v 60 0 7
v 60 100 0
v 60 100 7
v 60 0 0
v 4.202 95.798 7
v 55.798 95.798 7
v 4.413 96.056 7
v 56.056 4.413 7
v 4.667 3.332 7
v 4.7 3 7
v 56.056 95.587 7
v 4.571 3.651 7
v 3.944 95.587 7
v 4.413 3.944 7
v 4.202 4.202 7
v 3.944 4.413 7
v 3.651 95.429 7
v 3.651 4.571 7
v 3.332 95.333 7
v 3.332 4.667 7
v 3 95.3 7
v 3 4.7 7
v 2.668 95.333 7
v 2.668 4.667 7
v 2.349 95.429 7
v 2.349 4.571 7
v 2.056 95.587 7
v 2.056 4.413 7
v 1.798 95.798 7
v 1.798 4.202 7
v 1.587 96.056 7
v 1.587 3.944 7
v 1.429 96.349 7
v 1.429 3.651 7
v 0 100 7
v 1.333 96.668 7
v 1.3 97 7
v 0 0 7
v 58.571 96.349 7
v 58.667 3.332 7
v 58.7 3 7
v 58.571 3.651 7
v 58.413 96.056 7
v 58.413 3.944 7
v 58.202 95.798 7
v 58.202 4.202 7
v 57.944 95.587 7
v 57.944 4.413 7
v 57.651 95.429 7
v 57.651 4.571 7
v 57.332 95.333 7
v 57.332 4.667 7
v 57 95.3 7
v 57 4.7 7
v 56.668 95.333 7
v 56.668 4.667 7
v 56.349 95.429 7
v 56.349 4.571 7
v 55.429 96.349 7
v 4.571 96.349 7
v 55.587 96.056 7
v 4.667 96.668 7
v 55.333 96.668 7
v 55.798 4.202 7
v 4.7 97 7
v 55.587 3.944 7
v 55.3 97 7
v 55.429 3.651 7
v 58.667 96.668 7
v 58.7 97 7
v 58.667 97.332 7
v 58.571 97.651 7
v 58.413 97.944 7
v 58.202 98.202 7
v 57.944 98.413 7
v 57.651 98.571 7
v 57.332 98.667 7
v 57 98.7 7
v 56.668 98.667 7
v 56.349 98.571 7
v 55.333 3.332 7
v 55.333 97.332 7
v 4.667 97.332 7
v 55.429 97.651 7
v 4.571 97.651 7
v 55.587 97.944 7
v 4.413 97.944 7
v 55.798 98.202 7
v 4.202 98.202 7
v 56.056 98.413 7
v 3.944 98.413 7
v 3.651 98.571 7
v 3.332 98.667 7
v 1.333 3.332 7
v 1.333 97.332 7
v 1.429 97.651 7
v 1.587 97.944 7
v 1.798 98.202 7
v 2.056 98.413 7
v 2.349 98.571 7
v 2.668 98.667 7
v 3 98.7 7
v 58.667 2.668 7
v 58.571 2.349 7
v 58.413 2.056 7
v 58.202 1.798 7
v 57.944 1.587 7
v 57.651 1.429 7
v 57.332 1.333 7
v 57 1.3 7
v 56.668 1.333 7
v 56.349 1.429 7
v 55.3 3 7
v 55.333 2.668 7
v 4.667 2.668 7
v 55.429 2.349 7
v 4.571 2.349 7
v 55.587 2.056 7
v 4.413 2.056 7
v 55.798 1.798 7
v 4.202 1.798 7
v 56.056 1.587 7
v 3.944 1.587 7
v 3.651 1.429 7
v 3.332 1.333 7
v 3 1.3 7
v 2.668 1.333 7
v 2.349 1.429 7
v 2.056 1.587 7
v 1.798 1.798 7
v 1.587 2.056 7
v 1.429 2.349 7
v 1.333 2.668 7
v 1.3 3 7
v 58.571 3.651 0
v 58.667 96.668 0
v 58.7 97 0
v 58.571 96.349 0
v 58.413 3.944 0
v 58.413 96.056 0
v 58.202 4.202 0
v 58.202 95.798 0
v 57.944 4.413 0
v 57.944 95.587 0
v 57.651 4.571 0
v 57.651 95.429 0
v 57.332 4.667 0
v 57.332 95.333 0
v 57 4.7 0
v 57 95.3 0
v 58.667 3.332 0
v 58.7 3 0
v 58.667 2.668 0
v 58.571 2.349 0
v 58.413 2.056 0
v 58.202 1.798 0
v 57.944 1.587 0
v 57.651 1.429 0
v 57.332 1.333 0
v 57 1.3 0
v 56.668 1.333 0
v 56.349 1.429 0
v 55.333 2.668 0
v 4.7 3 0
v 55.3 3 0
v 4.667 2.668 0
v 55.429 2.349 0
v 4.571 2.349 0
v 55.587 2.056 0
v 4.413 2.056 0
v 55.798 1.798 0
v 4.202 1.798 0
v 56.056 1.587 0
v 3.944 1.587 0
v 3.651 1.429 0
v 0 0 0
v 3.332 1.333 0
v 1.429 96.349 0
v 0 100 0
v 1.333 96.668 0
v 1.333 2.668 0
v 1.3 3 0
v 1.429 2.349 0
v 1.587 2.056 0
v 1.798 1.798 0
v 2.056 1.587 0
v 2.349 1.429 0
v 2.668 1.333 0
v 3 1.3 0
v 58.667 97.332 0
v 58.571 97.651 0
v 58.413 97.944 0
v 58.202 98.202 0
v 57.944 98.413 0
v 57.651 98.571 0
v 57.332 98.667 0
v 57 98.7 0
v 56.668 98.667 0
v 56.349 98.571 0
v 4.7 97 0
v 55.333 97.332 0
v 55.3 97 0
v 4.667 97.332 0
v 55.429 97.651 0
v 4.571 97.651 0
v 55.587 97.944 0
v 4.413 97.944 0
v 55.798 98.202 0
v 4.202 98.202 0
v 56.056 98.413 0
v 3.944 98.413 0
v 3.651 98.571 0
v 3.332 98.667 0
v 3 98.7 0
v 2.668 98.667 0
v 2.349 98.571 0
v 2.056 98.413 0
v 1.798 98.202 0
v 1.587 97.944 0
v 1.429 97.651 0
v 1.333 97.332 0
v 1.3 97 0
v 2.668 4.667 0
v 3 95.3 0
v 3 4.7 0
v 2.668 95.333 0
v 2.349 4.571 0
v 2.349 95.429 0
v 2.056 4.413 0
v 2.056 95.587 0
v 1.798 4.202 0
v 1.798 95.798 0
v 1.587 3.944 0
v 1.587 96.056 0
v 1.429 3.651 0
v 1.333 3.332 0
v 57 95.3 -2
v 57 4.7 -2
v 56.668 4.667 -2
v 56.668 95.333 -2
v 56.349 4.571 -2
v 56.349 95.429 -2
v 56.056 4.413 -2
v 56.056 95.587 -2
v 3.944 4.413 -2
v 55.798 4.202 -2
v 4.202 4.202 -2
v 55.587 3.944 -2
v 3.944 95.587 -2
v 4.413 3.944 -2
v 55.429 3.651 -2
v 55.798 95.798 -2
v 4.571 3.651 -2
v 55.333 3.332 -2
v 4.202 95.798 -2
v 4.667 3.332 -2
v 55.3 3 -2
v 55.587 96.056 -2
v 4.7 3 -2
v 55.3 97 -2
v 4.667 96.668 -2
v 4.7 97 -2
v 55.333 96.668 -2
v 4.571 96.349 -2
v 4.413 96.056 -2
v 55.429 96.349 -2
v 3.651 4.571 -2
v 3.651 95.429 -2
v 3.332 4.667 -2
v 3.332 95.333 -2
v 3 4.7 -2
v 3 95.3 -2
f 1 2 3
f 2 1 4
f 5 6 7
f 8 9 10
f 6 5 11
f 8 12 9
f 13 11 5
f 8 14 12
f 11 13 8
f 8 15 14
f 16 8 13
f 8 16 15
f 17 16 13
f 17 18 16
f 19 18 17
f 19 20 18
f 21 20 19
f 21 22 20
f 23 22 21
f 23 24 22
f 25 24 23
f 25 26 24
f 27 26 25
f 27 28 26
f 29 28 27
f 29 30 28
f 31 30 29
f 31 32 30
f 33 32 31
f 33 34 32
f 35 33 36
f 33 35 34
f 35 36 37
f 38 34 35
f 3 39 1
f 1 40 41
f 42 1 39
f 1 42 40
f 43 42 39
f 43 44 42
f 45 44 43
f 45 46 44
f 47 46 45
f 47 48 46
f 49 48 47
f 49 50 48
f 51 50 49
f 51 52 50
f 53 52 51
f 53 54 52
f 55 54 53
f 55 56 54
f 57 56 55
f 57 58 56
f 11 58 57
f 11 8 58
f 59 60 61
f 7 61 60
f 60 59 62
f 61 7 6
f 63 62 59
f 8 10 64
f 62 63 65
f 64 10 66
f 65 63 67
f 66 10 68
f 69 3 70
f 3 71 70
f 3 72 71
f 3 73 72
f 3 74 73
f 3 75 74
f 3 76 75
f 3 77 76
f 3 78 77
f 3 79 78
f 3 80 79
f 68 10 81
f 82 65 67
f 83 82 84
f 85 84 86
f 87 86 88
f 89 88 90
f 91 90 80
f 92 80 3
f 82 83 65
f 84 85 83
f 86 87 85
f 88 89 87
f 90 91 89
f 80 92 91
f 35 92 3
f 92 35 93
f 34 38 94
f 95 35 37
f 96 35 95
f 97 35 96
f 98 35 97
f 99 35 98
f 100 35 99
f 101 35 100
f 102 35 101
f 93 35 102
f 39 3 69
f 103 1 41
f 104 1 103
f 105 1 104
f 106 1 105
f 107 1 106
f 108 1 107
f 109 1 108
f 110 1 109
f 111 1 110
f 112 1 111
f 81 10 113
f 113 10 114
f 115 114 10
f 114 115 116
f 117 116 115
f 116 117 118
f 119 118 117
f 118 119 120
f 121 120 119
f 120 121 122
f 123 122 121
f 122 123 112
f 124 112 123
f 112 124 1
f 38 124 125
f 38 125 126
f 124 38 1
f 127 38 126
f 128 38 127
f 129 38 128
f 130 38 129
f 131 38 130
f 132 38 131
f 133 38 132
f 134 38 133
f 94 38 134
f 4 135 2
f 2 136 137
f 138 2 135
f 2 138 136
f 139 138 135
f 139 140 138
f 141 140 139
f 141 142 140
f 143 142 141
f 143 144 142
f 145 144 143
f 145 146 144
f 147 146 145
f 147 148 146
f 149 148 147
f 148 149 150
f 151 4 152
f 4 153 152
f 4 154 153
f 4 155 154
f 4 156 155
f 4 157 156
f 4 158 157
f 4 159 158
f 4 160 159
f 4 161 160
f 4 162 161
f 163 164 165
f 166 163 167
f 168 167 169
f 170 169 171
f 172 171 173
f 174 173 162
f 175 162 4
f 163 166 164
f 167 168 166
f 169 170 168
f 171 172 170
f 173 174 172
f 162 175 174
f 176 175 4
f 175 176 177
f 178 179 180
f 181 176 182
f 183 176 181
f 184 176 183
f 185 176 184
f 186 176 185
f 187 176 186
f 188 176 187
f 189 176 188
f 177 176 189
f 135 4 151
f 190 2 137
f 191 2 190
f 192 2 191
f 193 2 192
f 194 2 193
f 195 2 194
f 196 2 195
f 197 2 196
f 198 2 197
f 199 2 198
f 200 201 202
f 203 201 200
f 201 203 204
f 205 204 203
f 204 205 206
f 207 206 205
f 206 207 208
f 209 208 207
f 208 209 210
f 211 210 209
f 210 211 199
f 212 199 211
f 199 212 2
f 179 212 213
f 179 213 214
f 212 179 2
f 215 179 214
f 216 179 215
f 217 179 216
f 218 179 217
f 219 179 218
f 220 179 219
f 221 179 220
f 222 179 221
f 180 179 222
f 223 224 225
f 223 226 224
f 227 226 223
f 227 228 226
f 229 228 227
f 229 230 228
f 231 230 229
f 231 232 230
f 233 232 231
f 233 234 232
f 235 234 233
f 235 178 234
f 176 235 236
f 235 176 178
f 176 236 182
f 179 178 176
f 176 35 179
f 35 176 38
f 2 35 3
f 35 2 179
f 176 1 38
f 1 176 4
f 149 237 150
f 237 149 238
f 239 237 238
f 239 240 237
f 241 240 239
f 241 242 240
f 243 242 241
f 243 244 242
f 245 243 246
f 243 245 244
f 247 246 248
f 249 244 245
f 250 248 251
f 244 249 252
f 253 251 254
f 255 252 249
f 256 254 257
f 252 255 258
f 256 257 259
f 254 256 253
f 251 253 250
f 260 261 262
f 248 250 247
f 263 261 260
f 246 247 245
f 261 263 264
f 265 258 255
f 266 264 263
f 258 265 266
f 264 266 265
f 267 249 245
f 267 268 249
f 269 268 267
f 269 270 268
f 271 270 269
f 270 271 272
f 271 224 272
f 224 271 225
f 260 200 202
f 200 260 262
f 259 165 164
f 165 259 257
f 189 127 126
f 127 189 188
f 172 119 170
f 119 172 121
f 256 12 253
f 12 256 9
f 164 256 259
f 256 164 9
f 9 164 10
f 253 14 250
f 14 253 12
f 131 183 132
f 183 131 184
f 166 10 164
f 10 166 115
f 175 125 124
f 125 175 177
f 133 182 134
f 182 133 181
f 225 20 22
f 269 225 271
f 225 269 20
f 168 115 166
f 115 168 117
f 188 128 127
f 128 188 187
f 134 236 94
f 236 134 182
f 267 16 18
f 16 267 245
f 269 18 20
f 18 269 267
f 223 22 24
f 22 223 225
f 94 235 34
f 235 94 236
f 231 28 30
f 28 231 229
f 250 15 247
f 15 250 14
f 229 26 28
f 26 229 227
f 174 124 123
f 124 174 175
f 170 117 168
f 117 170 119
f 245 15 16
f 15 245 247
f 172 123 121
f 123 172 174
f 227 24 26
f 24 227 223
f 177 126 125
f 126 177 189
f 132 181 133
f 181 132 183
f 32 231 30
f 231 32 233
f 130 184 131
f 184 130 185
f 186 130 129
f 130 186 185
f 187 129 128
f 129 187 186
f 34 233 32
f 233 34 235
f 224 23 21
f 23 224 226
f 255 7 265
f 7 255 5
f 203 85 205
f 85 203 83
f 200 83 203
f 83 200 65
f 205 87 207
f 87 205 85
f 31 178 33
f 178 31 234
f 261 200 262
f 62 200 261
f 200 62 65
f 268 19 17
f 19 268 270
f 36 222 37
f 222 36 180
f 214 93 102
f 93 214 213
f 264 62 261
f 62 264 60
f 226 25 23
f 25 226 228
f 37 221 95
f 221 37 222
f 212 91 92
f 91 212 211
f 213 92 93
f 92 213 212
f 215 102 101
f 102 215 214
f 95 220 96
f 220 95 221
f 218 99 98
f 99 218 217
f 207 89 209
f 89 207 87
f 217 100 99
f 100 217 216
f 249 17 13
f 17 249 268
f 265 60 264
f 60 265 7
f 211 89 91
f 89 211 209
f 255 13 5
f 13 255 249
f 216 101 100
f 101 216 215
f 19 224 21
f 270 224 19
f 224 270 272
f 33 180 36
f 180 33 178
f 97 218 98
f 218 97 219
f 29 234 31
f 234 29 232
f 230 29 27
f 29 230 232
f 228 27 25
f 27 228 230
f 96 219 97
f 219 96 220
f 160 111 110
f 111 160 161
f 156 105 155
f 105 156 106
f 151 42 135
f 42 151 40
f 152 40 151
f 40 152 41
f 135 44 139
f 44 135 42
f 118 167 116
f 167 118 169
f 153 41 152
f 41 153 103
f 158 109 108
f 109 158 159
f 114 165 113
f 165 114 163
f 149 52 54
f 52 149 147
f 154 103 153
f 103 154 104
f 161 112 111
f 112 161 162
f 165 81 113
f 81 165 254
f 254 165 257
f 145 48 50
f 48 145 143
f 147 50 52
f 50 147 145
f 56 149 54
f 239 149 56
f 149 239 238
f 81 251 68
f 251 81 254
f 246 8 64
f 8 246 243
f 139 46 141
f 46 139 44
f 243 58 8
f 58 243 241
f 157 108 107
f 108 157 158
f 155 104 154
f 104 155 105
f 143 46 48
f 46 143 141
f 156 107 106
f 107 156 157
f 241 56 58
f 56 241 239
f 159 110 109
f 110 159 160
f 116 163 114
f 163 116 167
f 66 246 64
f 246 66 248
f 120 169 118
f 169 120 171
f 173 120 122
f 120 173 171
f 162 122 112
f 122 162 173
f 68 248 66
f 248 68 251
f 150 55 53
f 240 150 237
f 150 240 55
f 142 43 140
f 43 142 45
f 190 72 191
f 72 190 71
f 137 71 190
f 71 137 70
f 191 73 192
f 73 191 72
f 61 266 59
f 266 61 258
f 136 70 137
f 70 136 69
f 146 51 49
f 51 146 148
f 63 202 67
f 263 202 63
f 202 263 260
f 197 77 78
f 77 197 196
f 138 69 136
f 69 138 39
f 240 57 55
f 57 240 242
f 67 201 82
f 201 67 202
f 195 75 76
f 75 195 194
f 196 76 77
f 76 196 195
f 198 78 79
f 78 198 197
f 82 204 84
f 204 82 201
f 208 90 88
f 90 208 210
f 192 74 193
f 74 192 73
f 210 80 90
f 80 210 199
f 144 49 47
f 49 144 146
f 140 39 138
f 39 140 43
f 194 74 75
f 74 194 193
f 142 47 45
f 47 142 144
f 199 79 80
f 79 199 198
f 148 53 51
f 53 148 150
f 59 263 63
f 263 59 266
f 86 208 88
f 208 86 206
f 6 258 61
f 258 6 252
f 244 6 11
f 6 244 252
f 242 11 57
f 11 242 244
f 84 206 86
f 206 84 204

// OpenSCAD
$fn = 32;

// ----------------------------------------------------------------------
// Enclosure lid: 60 x 100 x 7 mm, 4 bolt holes
// ----------------------------------------------------------------------

// --- parameters (mm) ---
length = 60;              // lid length, X
width = 100;              // lid width, Y
plate_t = 7;              // lid plate thickness
bolt_d = 3.4;             // bolt clearance
boss_lip = 3;             // bolt hole inset from the corner
sink = 1;                 // overlap of the lip and ribs into the plate
lip_h = 3;                // lip height below the plate
lip_wall = 3;             // lip wall thickness

module plate() {
  cube([length, width, plate_t]);
  /* lip that drops into the housing opening, sunk into the plate */
  translate([lip_wall, lip_wall, -lip_h + sink]) cube([length - 2 * lip_wall, width - 2 * lip_wall, lip_h]);
}

difference() {
  plate();
  /* bolt pattern matching the corner bosses */
  for (sx = [0, 1]) for (sy = [0, 1])
    translate([sx * (length - 2 * boss_lip) + boss_lip, sy * (width - 2 * boss_lip) + boss_lip, -lip_h - 1])
      cylinder(h = plate_t + lip_h + 2, d = bolt_d);
}
